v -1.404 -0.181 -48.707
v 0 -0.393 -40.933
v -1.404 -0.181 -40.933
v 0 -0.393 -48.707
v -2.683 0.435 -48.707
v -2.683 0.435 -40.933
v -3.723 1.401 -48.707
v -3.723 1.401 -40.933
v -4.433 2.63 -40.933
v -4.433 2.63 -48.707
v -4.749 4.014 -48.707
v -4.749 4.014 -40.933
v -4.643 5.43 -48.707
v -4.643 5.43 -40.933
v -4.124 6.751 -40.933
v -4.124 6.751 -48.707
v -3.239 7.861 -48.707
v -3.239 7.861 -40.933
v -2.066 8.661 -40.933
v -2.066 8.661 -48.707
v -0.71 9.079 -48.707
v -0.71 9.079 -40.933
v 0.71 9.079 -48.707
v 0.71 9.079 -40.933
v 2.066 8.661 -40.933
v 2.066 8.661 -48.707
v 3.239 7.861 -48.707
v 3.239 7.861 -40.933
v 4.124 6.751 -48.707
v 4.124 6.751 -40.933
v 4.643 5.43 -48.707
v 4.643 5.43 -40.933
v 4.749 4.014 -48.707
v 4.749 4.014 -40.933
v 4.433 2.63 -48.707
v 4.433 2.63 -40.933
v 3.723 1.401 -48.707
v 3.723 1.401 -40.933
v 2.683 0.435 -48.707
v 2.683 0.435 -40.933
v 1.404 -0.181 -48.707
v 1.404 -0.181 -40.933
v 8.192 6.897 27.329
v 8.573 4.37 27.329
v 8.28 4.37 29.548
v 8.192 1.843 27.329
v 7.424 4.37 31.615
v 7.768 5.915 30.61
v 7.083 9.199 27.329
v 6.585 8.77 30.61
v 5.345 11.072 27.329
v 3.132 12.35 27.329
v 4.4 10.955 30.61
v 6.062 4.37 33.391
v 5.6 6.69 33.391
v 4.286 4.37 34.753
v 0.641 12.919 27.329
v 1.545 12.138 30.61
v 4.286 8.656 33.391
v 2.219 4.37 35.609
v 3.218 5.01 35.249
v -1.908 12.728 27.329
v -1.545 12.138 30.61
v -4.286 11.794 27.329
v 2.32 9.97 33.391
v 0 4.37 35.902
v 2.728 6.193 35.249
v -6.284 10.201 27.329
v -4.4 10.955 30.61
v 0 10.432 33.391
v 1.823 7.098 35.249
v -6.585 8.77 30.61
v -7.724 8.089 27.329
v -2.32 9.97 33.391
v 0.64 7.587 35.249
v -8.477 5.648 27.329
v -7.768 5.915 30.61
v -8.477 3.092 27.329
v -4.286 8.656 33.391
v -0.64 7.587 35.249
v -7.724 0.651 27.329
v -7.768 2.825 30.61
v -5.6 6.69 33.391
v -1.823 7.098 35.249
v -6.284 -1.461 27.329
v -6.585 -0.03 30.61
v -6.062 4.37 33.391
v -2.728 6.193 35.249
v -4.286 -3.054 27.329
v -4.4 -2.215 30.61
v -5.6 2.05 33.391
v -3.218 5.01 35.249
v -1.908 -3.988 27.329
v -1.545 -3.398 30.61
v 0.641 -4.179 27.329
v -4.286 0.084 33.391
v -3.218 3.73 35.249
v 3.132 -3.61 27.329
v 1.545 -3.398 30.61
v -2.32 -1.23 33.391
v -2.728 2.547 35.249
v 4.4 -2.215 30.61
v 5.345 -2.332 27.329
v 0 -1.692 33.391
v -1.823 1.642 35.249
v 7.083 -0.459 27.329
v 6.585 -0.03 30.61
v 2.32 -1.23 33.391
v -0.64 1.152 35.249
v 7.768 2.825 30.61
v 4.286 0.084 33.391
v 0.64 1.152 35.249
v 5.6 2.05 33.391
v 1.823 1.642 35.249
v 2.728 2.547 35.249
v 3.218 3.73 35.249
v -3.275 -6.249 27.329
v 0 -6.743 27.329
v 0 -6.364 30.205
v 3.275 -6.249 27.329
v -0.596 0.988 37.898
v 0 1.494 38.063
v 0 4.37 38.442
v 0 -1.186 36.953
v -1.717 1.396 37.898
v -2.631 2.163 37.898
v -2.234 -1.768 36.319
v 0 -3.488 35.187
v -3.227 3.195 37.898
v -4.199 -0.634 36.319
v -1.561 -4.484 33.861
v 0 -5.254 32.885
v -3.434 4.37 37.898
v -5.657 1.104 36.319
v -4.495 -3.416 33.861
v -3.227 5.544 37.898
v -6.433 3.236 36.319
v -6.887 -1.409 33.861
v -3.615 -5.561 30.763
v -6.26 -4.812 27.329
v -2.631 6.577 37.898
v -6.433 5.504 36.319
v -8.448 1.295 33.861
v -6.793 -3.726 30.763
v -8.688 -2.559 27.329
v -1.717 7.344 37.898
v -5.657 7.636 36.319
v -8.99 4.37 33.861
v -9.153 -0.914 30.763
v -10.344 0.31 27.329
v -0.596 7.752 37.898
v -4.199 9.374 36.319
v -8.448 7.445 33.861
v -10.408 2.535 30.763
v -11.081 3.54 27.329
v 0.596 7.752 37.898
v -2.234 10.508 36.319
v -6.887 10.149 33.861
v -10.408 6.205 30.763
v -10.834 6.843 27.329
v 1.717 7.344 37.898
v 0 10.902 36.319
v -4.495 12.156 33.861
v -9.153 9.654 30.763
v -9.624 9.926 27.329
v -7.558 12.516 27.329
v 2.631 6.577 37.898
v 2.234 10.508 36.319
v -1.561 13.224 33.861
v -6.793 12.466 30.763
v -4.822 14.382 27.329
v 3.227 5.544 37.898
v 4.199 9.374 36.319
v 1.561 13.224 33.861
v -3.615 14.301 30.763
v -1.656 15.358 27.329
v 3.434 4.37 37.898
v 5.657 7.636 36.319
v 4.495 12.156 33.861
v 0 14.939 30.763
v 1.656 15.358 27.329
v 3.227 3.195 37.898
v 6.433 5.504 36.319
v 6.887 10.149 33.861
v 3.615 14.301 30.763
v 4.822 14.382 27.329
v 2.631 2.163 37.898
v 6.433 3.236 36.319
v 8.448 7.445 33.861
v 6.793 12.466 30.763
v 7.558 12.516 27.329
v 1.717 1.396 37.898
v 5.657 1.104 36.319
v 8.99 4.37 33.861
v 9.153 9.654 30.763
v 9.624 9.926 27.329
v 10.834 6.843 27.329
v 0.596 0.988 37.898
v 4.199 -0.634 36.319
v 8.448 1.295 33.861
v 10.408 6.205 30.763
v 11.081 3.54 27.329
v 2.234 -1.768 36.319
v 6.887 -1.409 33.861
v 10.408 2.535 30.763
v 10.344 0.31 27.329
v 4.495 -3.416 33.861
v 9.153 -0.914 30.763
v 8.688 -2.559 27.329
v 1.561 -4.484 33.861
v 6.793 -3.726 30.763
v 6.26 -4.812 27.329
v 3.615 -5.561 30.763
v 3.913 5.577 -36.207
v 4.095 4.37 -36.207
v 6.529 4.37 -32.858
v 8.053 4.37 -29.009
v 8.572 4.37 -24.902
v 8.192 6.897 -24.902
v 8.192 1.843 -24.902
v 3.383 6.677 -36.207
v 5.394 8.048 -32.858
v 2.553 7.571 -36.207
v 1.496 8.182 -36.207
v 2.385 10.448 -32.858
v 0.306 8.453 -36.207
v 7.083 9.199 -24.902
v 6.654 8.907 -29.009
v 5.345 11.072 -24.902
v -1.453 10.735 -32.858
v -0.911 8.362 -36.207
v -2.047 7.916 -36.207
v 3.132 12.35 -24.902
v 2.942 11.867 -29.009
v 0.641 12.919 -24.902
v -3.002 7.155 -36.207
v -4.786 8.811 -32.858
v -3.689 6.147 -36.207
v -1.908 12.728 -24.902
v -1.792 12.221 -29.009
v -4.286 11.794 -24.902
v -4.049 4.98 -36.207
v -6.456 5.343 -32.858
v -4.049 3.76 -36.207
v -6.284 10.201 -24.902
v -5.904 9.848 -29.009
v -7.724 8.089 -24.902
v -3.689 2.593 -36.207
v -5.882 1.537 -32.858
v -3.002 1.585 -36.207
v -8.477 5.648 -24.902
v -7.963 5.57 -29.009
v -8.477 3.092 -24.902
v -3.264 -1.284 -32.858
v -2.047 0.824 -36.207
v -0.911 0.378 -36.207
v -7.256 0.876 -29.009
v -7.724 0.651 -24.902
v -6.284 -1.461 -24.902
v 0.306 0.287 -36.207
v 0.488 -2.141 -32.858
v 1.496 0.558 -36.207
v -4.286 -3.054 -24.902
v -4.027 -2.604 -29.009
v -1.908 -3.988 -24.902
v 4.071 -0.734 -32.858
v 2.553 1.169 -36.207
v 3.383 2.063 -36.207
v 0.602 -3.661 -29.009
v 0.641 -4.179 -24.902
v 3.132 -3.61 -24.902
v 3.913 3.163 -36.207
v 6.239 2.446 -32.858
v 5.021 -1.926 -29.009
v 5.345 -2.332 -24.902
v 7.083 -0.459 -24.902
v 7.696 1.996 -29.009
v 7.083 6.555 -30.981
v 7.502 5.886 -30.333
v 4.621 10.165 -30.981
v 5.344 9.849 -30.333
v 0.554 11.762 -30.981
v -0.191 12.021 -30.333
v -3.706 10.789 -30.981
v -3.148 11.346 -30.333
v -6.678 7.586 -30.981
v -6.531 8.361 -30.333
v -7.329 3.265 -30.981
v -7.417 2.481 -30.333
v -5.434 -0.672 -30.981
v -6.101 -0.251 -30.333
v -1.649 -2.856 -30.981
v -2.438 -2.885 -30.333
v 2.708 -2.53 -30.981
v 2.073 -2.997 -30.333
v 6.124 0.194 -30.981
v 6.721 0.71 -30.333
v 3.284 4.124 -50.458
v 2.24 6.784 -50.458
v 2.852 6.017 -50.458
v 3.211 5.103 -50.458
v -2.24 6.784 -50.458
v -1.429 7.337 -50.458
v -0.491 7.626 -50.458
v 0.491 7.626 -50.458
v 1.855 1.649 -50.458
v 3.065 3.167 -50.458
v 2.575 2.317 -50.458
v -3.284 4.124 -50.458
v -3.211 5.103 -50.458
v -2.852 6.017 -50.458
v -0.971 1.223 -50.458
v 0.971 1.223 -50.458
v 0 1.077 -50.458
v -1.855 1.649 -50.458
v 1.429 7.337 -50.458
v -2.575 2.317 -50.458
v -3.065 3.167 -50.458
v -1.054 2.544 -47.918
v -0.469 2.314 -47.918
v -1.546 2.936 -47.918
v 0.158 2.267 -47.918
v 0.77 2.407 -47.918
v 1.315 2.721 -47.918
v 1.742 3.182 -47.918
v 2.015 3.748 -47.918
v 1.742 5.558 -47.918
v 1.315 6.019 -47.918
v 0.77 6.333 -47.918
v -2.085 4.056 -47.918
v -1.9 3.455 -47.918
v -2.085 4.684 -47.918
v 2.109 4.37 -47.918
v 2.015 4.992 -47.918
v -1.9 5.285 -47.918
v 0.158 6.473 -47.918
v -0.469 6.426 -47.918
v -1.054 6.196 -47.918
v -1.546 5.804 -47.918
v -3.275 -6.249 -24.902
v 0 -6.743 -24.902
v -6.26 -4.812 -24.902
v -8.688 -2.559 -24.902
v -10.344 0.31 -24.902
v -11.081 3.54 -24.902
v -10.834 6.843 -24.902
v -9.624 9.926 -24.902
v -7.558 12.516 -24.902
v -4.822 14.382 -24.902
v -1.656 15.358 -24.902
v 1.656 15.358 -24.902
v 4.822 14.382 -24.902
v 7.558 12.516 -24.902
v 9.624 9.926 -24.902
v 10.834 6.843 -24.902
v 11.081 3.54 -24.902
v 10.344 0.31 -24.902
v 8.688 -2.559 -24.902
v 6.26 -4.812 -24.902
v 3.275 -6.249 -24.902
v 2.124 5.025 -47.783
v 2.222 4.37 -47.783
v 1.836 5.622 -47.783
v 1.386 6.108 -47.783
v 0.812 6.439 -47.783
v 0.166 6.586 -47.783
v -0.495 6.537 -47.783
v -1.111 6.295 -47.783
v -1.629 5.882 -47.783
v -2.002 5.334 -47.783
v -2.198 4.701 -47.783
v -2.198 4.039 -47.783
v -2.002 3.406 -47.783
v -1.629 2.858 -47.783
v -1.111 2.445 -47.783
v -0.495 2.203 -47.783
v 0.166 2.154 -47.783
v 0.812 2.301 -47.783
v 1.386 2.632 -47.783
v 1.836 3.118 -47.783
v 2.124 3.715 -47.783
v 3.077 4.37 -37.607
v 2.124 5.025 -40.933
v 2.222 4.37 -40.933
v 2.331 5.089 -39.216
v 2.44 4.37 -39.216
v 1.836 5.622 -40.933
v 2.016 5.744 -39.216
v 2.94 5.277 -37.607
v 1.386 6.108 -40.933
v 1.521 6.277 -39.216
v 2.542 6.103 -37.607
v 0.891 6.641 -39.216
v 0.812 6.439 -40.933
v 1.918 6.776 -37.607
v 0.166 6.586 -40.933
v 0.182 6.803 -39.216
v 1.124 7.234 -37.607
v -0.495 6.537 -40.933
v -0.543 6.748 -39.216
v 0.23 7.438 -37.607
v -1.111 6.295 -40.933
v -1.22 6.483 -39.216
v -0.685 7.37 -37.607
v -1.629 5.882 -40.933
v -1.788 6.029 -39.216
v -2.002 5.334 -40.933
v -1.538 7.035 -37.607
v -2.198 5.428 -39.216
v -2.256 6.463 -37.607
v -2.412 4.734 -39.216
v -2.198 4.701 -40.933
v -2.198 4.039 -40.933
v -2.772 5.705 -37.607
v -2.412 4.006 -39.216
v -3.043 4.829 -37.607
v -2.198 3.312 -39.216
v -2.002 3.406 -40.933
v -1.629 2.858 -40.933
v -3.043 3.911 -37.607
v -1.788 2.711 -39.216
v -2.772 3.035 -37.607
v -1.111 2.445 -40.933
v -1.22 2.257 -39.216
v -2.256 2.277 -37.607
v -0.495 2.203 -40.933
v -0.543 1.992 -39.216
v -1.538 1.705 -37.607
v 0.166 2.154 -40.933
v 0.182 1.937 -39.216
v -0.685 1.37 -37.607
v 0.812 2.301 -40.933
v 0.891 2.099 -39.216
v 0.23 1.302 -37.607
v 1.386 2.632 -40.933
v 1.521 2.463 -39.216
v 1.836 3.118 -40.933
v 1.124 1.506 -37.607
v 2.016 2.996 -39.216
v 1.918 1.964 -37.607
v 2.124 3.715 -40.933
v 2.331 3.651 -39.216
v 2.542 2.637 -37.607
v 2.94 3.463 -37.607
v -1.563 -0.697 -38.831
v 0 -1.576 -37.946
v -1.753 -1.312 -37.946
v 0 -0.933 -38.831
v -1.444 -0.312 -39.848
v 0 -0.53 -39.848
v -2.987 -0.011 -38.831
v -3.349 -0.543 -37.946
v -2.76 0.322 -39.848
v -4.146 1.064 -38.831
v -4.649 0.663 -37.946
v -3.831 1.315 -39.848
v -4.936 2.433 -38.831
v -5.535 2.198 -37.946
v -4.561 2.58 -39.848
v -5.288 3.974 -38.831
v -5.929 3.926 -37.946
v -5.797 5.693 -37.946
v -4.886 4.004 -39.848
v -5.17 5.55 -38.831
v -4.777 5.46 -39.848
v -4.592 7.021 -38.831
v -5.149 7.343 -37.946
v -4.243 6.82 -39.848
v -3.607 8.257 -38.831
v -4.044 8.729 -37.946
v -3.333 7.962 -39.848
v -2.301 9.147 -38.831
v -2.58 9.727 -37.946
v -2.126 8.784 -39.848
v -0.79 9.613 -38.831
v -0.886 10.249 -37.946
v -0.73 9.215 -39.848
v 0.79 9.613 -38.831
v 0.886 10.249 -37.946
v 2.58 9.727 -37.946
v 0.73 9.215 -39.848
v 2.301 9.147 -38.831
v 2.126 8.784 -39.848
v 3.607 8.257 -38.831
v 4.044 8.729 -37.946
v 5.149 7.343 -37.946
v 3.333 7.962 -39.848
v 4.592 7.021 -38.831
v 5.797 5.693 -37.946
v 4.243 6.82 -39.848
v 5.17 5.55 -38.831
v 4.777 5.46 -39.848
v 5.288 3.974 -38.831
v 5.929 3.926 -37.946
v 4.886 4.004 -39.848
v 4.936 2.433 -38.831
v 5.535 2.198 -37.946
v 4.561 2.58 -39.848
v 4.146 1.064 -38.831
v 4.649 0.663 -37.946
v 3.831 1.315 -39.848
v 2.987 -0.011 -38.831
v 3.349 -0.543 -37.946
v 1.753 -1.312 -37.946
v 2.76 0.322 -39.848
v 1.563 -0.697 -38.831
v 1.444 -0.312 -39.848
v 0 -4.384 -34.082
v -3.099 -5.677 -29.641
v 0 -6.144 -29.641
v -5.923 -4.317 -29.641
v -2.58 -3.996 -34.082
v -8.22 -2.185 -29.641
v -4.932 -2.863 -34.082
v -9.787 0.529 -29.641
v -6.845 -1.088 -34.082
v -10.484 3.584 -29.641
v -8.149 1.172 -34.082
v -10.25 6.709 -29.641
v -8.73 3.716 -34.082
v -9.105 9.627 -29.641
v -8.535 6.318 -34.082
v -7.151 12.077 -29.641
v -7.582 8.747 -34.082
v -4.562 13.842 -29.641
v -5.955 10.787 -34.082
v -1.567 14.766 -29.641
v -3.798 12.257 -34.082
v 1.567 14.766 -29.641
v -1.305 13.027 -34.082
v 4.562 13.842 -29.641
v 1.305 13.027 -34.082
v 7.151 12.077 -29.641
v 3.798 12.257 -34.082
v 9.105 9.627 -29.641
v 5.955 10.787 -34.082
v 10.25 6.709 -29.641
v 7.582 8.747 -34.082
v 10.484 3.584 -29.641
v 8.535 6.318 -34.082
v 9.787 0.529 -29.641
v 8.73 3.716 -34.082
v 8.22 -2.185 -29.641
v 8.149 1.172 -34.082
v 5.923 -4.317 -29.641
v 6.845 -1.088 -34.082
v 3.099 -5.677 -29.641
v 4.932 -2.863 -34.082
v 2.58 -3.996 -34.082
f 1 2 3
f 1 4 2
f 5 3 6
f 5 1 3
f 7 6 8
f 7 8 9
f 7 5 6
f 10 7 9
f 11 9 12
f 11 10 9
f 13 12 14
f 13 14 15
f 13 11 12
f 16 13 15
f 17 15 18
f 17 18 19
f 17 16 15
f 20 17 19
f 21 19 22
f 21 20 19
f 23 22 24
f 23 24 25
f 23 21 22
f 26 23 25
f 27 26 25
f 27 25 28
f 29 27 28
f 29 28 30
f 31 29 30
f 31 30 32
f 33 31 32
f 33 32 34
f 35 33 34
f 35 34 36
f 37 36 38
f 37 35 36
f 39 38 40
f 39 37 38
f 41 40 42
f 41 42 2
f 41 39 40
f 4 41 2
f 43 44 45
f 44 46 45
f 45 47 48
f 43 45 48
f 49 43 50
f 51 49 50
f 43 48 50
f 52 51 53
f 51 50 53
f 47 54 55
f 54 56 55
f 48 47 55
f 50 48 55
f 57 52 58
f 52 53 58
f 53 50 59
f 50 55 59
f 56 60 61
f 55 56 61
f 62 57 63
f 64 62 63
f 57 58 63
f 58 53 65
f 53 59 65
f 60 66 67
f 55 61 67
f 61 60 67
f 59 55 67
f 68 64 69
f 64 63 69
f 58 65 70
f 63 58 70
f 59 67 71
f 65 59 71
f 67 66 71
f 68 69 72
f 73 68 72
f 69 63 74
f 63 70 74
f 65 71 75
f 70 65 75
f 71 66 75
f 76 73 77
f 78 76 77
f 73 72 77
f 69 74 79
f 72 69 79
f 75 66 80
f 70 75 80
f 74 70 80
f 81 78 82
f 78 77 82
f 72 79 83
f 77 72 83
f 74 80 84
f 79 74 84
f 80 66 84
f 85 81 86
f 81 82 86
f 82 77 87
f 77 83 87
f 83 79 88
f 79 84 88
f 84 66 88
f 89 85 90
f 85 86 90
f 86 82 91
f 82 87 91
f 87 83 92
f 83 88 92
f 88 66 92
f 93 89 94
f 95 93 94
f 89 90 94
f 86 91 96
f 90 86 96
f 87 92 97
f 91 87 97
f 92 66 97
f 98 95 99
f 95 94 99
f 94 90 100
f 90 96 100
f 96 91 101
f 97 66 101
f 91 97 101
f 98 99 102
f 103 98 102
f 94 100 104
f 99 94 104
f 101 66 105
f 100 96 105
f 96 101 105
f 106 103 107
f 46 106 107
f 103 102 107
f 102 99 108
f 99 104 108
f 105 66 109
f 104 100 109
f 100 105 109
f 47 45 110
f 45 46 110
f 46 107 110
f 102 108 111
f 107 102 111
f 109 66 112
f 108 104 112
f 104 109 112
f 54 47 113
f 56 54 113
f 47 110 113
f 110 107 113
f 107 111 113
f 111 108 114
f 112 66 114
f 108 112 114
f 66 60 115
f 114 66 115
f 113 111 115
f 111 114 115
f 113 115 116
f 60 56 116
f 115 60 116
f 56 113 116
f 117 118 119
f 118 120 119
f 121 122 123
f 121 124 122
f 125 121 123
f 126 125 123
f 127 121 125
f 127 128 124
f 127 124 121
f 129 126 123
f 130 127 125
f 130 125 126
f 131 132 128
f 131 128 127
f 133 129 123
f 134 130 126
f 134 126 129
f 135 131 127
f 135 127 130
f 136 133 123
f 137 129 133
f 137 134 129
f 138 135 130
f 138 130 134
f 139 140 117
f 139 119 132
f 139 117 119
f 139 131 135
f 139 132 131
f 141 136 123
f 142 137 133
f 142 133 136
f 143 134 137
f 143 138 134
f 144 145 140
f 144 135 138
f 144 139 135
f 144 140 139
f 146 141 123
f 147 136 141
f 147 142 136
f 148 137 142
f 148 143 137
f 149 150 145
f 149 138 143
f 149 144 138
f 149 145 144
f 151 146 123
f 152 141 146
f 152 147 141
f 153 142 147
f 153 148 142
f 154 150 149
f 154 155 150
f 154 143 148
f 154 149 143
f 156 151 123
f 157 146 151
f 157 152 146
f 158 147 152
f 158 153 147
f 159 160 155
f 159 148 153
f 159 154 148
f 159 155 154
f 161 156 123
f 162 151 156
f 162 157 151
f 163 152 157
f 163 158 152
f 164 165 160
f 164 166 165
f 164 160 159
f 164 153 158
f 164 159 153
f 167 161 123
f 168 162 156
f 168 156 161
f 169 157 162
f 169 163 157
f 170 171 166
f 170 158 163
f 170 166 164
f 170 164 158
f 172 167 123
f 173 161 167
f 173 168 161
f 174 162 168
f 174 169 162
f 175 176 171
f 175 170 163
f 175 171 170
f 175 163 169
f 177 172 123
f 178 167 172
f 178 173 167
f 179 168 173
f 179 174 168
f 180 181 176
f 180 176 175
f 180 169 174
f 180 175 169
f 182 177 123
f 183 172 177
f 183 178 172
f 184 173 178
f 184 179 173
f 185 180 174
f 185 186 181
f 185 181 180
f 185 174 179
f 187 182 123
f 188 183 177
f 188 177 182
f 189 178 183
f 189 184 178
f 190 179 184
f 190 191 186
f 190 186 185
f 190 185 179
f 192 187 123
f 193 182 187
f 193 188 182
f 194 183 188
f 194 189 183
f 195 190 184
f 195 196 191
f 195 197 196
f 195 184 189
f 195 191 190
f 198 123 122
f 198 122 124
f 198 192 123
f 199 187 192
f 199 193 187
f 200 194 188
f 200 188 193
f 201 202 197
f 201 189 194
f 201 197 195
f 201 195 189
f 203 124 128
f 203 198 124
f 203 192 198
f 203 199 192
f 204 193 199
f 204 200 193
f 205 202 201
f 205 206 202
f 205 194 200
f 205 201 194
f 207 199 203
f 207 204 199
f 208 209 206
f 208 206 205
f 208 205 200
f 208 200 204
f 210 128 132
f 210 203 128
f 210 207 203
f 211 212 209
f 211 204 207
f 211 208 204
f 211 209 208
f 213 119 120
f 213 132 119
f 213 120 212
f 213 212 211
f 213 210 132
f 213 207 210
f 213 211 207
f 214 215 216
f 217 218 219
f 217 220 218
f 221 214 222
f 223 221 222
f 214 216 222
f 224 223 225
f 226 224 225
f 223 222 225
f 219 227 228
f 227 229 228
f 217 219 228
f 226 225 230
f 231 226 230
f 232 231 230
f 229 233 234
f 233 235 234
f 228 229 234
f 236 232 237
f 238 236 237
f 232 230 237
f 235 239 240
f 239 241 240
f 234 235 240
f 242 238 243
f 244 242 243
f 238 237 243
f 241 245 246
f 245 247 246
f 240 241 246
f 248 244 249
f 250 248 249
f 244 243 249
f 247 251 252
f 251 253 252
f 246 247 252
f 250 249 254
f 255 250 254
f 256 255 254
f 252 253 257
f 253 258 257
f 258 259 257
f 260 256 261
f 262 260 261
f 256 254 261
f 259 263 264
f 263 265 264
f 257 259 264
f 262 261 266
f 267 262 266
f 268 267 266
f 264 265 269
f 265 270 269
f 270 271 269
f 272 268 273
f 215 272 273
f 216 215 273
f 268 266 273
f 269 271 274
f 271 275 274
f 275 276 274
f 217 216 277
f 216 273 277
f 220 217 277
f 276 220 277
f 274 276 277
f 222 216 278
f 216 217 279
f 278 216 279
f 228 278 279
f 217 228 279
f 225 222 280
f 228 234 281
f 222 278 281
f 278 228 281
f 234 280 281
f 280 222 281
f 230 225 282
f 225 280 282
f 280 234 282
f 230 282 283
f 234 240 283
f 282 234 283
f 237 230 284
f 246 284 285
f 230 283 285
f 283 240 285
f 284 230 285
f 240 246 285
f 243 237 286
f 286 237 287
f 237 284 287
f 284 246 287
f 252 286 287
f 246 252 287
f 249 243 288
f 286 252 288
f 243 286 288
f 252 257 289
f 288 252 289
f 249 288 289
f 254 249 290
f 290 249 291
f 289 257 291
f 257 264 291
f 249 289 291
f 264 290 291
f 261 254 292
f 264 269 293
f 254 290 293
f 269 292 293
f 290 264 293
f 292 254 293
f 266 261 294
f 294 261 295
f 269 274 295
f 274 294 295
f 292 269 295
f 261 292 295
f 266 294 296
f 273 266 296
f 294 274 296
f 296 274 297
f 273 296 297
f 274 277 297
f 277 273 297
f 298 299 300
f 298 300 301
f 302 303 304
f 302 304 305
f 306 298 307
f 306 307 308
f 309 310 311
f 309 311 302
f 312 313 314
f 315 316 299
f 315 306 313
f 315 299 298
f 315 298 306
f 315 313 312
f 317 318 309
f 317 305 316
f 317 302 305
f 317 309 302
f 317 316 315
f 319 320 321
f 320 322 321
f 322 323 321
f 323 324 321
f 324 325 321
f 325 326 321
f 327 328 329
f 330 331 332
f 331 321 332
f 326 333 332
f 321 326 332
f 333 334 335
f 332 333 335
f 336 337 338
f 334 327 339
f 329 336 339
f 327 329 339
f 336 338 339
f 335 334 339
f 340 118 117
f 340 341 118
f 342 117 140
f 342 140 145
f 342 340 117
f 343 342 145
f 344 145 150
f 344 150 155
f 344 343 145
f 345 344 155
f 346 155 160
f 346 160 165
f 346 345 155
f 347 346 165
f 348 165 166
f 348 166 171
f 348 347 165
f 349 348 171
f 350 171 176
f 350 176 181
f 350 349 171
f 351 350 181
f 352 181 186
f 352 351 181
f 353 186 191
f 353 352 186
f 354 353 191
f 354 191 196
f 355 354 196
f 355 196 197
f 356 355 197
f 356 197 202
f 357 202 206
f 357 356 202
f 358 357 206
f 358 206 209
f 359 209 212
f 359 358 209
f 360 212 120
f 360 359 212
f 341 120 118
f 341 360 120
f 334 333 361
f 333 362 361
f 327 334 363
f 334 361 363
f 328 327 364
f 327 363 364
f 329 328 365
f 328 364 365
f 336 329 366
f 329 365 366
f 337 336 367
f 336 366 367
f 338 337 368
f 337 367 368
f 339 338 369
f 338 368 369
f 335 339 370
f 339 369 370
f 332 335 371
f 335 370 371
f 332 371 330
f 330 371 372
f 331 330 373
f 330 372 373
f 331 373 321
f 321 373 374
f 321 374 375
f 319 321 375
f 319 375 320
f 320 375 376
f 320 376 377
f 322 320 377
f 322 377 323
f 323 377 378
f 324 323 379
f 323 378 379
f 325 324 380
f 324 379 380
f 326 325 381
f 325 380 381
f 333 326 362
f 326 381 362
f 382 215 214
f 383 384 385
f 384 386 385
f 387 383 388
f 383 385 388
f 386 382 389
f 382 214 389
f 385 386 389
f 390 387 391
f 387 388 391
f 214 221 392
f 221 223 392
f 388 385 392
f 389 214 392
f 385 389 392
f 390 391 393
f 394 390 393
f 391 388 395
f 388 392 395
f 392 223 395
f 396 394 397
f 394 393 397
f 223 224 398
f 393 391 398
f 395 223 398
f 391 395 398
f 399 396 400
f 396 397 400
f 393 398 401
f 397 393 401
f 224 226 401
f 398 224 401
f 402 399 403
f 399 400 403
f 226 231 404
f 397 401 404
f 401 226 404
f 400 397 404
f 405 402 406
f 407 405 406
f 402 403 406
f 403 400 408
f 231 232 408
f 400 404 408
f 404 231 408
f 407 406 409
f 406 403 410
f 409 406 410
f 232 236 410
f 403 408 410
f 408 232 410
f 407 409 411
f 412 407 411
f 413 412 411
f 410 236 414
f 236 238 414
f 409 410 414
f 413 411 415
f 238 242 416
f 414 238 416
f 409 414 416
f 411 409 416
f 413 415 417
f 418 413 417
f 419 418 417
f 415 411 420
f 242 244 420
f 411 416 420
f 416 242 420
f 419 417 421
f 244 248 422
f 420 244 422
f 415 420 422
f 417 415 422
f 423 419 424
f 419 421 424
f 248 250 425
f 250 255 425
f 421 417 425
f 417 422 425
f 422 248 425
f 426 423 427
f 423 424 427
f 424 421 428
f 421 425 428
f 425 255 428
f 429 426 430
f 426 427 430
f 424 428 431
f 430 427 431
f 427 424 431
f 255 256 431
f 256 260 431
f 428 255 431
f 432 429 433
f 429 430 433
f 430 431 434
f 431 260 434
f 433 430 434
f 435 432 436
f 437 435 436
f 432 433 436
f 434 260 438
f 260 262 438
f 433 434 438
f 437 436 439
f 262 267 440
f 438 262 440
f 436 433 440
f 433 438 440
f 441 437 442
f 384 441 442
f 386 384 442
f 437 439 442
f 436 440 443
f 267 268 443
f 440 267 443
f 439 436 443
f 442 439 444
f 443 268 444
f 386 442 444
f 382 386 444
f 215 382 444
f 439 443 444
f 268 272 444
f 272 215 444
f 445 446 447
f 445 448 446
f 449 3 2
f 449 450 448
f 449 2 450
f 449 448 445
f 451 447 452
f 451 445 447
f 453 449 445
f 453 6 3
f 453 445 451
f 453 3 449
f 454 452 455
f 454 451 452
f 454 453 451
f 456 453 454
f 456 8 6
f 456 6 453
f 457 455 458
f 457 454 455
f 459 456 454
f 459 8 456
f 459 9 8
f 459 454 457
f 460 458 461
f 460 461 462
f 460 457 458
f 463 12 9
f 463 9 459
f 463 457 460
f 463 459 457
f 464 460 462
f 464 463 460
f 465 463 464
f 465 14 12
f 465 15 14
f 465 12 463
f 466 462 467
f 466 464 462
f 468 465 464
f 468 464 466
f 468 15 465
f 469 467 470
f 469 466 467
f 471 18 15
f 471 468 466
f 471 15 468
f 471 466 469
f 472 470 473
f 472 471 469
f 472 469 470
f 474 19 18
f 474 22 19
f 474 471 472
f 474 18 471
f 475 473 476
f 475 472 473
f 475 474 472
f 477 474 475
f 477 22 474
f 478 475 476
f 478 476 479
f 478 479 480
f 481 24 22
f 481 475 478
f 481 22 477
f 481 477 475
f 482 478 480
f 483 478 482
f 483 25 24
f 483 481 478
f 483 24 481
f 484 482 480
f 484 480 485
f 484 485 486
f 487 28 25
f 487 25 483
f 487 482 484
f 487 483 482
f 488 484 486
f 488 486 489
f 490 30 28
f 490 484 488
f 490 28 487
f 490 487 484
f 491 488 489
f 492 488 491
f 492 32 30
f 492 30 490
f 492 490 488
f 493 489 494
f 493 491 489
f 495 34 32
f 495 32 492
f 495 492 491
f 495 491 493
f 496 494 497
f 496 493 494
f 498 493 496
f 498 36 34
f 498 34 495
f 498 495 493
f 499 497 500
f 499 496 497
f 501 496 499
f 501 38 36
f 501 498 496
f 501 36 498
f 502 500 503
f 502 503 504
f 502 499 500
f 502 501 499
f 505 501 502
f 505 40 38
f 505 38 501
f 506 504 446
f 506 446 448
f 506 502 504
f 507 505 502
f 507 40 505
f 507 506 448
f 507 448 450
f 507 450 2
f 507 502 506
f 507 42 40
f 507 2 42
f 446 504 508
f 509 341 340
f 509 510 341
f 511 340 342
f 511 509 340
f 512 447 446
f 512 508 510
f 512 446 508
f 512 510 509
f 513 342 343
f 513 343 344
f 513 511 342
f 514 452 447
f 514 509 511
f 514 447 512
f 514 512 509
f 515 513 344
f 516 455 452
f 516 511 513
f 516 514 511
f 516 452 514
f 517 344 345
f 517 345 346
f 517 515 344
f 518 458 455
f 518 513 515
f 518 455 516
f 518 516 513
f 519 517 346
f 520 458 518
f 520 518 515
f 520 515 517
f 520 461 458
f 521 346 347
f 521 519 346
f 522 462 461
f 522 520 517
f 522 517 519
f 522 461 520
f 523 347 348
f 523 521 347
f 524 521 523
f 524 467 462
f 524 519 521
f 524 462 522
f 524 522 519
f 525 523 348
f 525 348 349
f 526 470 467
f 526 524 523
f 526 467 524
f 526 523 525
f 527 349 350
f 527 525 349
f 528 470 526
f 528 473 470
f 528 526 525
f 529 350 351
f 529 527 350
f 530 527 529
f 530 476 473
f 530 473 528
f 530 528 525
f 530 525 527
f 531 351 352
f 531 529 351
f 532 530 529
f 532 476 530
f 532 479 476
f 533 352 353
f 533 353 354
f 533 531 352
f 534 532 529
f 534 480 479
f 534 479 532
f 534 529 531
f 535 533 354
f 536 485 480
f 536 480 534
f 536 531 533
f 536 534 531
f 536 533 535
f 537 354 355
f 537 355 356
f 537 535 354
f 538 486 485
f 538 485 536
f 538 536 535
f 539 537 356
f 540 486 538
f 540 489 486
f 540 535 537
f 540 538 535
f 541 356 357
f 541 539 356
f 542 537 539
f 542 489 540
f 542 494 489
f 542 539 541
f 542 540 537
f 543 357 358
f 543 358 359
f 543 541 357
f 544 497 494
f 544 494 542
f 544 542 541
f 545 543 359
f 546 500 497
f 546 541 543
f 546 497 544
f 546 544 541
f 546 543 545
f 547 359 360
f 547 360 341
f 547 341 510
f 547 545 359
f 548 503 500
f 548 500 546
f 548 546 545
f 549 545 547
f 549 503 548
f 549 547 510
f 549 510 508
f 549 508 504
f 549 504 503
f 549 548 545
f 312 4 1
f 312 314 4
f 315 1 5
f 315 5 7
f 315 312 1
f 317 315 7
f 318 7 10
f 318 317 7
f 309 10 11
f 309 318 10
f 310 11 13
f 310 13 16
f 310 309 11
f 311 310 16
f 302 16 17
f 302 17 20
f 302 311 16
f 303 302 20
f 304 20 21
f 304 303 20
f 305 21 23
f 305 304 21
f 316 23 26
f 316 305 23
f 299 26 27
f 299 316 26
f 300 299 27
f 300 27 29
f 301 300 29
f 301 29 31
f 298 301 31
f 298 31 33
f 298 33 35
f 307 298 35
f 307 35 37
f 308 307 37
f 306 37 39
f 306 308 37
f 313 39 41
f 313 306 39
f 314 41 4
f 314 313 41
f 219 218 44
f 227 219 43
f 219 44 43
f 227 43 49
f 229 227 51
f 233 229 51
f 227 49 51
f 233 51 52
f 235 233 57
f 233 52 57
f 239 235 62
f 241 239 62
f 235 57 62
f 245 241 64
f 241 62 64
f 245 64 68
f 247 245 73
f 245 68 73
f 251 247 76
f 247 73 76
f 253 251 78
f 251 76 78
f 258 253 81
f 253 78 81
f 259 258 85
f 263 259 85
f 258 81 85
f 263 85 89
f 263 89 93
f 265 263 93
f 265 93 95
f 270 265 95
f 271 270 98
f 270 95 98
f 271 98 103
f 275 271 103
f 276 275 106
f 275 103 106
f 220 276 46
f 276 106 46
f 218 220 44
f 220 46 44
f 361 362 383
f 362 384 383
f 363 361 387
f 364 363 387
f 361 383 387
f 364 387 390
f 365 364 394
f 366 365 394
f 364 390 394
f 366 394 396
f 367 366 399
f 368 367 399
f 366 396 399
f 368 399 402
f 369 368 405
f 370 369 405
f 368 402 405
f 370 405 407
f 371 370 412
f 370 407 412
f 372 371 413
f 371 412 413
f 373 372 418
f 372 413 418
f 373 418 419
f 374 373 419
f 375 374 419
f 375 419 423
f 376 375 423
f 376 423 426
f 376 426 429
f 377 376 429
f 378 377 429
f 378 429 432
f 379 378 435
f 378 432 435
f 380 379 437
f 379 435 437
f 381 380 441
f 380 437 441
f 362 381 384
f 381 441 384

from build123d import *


# Read off the part's stored shape, not the designer's step: Shell1
with BuildPart() as part:
    # Sketch3 → Revolve3 (revolve)
    with BuildSketch(Plane(origin=(0, 0, 0), x_dir=(0, 0, -1), z_dir=(1, 0, 0)), mode=Mode.PRIVATE) as revolve3_sk:
        with BuildLine():
            Line((40.933444221, 9.132480421), (48.707266624, 9.132480421))
            Line((48.707266624, 9.132480421), (50.458444221, 7.663067945))
            Line((50.458444221, 7.663067945), (50.458444221, 4.369980421))
            Line((50.458444221, 4.369980421), (-38.441555779, 4.369980421))
            ThreePointArc((-38.441555779, 4.369980421), (-35.186779885, 12.227704527), (-27.329055779, 15.482480421))
            Line((-27.329055779, 15.482480421), (24.901639323, 15.482480421))
            ThreePointArc((24.901639323, 15.482480421), (31.916856339, 14.14375452), (37.946094067, 10.315732937))
            ThreePointArc((37.946094067, 10.315732937), (39.32686809, 9.439066101), (40.933444221, 9.132480421))
        make_face()
    revolve(revolve3_sk.sketch.rotate(Axis((0, 4.369980421, 38.441555779), (0, 0, -1)), 180), axis=Axis((0, 4.369980421, 38.441555779), (0, 0, -1)))

    # Shell1 outline → Shell1 (revolve, cut)
    with BuildSketch(Plane.XZ.offset(-4.369980421)):
        with BuildLine():
            ThreePointArc((4.09465218, -36.206833435), (7.412270886, -30.981494071), (8.5725, -24.901639323))
            Line((8.5725, -24.901639323), (8.5725, 27.329055776))
            ThreePointArc((8.5725, 27.329055776), (6.061672883, 33.39072866), (0, 35.901555779))
            Line((0, 35.901555779), (0, -47.918444221))
            Line((0, -47.918444221), (2.108666073, -47.918444221))
            Line((2.108666073, -47.918444221), (2.2225, -47.782782229))
            Line((2.2225, -47.782782229), (2.2225, -40.933444221))
            ThreePointArc((2.2225, -40.933444221), (2.707582467, -38.391505822), (4.09465218, -36.206833435))
        make_face()
    revolve(axis=Axis((0, 4.369980421, 0), (0, 0, 1)), mode=Mode.SUBTRACT)


solid = part.part
